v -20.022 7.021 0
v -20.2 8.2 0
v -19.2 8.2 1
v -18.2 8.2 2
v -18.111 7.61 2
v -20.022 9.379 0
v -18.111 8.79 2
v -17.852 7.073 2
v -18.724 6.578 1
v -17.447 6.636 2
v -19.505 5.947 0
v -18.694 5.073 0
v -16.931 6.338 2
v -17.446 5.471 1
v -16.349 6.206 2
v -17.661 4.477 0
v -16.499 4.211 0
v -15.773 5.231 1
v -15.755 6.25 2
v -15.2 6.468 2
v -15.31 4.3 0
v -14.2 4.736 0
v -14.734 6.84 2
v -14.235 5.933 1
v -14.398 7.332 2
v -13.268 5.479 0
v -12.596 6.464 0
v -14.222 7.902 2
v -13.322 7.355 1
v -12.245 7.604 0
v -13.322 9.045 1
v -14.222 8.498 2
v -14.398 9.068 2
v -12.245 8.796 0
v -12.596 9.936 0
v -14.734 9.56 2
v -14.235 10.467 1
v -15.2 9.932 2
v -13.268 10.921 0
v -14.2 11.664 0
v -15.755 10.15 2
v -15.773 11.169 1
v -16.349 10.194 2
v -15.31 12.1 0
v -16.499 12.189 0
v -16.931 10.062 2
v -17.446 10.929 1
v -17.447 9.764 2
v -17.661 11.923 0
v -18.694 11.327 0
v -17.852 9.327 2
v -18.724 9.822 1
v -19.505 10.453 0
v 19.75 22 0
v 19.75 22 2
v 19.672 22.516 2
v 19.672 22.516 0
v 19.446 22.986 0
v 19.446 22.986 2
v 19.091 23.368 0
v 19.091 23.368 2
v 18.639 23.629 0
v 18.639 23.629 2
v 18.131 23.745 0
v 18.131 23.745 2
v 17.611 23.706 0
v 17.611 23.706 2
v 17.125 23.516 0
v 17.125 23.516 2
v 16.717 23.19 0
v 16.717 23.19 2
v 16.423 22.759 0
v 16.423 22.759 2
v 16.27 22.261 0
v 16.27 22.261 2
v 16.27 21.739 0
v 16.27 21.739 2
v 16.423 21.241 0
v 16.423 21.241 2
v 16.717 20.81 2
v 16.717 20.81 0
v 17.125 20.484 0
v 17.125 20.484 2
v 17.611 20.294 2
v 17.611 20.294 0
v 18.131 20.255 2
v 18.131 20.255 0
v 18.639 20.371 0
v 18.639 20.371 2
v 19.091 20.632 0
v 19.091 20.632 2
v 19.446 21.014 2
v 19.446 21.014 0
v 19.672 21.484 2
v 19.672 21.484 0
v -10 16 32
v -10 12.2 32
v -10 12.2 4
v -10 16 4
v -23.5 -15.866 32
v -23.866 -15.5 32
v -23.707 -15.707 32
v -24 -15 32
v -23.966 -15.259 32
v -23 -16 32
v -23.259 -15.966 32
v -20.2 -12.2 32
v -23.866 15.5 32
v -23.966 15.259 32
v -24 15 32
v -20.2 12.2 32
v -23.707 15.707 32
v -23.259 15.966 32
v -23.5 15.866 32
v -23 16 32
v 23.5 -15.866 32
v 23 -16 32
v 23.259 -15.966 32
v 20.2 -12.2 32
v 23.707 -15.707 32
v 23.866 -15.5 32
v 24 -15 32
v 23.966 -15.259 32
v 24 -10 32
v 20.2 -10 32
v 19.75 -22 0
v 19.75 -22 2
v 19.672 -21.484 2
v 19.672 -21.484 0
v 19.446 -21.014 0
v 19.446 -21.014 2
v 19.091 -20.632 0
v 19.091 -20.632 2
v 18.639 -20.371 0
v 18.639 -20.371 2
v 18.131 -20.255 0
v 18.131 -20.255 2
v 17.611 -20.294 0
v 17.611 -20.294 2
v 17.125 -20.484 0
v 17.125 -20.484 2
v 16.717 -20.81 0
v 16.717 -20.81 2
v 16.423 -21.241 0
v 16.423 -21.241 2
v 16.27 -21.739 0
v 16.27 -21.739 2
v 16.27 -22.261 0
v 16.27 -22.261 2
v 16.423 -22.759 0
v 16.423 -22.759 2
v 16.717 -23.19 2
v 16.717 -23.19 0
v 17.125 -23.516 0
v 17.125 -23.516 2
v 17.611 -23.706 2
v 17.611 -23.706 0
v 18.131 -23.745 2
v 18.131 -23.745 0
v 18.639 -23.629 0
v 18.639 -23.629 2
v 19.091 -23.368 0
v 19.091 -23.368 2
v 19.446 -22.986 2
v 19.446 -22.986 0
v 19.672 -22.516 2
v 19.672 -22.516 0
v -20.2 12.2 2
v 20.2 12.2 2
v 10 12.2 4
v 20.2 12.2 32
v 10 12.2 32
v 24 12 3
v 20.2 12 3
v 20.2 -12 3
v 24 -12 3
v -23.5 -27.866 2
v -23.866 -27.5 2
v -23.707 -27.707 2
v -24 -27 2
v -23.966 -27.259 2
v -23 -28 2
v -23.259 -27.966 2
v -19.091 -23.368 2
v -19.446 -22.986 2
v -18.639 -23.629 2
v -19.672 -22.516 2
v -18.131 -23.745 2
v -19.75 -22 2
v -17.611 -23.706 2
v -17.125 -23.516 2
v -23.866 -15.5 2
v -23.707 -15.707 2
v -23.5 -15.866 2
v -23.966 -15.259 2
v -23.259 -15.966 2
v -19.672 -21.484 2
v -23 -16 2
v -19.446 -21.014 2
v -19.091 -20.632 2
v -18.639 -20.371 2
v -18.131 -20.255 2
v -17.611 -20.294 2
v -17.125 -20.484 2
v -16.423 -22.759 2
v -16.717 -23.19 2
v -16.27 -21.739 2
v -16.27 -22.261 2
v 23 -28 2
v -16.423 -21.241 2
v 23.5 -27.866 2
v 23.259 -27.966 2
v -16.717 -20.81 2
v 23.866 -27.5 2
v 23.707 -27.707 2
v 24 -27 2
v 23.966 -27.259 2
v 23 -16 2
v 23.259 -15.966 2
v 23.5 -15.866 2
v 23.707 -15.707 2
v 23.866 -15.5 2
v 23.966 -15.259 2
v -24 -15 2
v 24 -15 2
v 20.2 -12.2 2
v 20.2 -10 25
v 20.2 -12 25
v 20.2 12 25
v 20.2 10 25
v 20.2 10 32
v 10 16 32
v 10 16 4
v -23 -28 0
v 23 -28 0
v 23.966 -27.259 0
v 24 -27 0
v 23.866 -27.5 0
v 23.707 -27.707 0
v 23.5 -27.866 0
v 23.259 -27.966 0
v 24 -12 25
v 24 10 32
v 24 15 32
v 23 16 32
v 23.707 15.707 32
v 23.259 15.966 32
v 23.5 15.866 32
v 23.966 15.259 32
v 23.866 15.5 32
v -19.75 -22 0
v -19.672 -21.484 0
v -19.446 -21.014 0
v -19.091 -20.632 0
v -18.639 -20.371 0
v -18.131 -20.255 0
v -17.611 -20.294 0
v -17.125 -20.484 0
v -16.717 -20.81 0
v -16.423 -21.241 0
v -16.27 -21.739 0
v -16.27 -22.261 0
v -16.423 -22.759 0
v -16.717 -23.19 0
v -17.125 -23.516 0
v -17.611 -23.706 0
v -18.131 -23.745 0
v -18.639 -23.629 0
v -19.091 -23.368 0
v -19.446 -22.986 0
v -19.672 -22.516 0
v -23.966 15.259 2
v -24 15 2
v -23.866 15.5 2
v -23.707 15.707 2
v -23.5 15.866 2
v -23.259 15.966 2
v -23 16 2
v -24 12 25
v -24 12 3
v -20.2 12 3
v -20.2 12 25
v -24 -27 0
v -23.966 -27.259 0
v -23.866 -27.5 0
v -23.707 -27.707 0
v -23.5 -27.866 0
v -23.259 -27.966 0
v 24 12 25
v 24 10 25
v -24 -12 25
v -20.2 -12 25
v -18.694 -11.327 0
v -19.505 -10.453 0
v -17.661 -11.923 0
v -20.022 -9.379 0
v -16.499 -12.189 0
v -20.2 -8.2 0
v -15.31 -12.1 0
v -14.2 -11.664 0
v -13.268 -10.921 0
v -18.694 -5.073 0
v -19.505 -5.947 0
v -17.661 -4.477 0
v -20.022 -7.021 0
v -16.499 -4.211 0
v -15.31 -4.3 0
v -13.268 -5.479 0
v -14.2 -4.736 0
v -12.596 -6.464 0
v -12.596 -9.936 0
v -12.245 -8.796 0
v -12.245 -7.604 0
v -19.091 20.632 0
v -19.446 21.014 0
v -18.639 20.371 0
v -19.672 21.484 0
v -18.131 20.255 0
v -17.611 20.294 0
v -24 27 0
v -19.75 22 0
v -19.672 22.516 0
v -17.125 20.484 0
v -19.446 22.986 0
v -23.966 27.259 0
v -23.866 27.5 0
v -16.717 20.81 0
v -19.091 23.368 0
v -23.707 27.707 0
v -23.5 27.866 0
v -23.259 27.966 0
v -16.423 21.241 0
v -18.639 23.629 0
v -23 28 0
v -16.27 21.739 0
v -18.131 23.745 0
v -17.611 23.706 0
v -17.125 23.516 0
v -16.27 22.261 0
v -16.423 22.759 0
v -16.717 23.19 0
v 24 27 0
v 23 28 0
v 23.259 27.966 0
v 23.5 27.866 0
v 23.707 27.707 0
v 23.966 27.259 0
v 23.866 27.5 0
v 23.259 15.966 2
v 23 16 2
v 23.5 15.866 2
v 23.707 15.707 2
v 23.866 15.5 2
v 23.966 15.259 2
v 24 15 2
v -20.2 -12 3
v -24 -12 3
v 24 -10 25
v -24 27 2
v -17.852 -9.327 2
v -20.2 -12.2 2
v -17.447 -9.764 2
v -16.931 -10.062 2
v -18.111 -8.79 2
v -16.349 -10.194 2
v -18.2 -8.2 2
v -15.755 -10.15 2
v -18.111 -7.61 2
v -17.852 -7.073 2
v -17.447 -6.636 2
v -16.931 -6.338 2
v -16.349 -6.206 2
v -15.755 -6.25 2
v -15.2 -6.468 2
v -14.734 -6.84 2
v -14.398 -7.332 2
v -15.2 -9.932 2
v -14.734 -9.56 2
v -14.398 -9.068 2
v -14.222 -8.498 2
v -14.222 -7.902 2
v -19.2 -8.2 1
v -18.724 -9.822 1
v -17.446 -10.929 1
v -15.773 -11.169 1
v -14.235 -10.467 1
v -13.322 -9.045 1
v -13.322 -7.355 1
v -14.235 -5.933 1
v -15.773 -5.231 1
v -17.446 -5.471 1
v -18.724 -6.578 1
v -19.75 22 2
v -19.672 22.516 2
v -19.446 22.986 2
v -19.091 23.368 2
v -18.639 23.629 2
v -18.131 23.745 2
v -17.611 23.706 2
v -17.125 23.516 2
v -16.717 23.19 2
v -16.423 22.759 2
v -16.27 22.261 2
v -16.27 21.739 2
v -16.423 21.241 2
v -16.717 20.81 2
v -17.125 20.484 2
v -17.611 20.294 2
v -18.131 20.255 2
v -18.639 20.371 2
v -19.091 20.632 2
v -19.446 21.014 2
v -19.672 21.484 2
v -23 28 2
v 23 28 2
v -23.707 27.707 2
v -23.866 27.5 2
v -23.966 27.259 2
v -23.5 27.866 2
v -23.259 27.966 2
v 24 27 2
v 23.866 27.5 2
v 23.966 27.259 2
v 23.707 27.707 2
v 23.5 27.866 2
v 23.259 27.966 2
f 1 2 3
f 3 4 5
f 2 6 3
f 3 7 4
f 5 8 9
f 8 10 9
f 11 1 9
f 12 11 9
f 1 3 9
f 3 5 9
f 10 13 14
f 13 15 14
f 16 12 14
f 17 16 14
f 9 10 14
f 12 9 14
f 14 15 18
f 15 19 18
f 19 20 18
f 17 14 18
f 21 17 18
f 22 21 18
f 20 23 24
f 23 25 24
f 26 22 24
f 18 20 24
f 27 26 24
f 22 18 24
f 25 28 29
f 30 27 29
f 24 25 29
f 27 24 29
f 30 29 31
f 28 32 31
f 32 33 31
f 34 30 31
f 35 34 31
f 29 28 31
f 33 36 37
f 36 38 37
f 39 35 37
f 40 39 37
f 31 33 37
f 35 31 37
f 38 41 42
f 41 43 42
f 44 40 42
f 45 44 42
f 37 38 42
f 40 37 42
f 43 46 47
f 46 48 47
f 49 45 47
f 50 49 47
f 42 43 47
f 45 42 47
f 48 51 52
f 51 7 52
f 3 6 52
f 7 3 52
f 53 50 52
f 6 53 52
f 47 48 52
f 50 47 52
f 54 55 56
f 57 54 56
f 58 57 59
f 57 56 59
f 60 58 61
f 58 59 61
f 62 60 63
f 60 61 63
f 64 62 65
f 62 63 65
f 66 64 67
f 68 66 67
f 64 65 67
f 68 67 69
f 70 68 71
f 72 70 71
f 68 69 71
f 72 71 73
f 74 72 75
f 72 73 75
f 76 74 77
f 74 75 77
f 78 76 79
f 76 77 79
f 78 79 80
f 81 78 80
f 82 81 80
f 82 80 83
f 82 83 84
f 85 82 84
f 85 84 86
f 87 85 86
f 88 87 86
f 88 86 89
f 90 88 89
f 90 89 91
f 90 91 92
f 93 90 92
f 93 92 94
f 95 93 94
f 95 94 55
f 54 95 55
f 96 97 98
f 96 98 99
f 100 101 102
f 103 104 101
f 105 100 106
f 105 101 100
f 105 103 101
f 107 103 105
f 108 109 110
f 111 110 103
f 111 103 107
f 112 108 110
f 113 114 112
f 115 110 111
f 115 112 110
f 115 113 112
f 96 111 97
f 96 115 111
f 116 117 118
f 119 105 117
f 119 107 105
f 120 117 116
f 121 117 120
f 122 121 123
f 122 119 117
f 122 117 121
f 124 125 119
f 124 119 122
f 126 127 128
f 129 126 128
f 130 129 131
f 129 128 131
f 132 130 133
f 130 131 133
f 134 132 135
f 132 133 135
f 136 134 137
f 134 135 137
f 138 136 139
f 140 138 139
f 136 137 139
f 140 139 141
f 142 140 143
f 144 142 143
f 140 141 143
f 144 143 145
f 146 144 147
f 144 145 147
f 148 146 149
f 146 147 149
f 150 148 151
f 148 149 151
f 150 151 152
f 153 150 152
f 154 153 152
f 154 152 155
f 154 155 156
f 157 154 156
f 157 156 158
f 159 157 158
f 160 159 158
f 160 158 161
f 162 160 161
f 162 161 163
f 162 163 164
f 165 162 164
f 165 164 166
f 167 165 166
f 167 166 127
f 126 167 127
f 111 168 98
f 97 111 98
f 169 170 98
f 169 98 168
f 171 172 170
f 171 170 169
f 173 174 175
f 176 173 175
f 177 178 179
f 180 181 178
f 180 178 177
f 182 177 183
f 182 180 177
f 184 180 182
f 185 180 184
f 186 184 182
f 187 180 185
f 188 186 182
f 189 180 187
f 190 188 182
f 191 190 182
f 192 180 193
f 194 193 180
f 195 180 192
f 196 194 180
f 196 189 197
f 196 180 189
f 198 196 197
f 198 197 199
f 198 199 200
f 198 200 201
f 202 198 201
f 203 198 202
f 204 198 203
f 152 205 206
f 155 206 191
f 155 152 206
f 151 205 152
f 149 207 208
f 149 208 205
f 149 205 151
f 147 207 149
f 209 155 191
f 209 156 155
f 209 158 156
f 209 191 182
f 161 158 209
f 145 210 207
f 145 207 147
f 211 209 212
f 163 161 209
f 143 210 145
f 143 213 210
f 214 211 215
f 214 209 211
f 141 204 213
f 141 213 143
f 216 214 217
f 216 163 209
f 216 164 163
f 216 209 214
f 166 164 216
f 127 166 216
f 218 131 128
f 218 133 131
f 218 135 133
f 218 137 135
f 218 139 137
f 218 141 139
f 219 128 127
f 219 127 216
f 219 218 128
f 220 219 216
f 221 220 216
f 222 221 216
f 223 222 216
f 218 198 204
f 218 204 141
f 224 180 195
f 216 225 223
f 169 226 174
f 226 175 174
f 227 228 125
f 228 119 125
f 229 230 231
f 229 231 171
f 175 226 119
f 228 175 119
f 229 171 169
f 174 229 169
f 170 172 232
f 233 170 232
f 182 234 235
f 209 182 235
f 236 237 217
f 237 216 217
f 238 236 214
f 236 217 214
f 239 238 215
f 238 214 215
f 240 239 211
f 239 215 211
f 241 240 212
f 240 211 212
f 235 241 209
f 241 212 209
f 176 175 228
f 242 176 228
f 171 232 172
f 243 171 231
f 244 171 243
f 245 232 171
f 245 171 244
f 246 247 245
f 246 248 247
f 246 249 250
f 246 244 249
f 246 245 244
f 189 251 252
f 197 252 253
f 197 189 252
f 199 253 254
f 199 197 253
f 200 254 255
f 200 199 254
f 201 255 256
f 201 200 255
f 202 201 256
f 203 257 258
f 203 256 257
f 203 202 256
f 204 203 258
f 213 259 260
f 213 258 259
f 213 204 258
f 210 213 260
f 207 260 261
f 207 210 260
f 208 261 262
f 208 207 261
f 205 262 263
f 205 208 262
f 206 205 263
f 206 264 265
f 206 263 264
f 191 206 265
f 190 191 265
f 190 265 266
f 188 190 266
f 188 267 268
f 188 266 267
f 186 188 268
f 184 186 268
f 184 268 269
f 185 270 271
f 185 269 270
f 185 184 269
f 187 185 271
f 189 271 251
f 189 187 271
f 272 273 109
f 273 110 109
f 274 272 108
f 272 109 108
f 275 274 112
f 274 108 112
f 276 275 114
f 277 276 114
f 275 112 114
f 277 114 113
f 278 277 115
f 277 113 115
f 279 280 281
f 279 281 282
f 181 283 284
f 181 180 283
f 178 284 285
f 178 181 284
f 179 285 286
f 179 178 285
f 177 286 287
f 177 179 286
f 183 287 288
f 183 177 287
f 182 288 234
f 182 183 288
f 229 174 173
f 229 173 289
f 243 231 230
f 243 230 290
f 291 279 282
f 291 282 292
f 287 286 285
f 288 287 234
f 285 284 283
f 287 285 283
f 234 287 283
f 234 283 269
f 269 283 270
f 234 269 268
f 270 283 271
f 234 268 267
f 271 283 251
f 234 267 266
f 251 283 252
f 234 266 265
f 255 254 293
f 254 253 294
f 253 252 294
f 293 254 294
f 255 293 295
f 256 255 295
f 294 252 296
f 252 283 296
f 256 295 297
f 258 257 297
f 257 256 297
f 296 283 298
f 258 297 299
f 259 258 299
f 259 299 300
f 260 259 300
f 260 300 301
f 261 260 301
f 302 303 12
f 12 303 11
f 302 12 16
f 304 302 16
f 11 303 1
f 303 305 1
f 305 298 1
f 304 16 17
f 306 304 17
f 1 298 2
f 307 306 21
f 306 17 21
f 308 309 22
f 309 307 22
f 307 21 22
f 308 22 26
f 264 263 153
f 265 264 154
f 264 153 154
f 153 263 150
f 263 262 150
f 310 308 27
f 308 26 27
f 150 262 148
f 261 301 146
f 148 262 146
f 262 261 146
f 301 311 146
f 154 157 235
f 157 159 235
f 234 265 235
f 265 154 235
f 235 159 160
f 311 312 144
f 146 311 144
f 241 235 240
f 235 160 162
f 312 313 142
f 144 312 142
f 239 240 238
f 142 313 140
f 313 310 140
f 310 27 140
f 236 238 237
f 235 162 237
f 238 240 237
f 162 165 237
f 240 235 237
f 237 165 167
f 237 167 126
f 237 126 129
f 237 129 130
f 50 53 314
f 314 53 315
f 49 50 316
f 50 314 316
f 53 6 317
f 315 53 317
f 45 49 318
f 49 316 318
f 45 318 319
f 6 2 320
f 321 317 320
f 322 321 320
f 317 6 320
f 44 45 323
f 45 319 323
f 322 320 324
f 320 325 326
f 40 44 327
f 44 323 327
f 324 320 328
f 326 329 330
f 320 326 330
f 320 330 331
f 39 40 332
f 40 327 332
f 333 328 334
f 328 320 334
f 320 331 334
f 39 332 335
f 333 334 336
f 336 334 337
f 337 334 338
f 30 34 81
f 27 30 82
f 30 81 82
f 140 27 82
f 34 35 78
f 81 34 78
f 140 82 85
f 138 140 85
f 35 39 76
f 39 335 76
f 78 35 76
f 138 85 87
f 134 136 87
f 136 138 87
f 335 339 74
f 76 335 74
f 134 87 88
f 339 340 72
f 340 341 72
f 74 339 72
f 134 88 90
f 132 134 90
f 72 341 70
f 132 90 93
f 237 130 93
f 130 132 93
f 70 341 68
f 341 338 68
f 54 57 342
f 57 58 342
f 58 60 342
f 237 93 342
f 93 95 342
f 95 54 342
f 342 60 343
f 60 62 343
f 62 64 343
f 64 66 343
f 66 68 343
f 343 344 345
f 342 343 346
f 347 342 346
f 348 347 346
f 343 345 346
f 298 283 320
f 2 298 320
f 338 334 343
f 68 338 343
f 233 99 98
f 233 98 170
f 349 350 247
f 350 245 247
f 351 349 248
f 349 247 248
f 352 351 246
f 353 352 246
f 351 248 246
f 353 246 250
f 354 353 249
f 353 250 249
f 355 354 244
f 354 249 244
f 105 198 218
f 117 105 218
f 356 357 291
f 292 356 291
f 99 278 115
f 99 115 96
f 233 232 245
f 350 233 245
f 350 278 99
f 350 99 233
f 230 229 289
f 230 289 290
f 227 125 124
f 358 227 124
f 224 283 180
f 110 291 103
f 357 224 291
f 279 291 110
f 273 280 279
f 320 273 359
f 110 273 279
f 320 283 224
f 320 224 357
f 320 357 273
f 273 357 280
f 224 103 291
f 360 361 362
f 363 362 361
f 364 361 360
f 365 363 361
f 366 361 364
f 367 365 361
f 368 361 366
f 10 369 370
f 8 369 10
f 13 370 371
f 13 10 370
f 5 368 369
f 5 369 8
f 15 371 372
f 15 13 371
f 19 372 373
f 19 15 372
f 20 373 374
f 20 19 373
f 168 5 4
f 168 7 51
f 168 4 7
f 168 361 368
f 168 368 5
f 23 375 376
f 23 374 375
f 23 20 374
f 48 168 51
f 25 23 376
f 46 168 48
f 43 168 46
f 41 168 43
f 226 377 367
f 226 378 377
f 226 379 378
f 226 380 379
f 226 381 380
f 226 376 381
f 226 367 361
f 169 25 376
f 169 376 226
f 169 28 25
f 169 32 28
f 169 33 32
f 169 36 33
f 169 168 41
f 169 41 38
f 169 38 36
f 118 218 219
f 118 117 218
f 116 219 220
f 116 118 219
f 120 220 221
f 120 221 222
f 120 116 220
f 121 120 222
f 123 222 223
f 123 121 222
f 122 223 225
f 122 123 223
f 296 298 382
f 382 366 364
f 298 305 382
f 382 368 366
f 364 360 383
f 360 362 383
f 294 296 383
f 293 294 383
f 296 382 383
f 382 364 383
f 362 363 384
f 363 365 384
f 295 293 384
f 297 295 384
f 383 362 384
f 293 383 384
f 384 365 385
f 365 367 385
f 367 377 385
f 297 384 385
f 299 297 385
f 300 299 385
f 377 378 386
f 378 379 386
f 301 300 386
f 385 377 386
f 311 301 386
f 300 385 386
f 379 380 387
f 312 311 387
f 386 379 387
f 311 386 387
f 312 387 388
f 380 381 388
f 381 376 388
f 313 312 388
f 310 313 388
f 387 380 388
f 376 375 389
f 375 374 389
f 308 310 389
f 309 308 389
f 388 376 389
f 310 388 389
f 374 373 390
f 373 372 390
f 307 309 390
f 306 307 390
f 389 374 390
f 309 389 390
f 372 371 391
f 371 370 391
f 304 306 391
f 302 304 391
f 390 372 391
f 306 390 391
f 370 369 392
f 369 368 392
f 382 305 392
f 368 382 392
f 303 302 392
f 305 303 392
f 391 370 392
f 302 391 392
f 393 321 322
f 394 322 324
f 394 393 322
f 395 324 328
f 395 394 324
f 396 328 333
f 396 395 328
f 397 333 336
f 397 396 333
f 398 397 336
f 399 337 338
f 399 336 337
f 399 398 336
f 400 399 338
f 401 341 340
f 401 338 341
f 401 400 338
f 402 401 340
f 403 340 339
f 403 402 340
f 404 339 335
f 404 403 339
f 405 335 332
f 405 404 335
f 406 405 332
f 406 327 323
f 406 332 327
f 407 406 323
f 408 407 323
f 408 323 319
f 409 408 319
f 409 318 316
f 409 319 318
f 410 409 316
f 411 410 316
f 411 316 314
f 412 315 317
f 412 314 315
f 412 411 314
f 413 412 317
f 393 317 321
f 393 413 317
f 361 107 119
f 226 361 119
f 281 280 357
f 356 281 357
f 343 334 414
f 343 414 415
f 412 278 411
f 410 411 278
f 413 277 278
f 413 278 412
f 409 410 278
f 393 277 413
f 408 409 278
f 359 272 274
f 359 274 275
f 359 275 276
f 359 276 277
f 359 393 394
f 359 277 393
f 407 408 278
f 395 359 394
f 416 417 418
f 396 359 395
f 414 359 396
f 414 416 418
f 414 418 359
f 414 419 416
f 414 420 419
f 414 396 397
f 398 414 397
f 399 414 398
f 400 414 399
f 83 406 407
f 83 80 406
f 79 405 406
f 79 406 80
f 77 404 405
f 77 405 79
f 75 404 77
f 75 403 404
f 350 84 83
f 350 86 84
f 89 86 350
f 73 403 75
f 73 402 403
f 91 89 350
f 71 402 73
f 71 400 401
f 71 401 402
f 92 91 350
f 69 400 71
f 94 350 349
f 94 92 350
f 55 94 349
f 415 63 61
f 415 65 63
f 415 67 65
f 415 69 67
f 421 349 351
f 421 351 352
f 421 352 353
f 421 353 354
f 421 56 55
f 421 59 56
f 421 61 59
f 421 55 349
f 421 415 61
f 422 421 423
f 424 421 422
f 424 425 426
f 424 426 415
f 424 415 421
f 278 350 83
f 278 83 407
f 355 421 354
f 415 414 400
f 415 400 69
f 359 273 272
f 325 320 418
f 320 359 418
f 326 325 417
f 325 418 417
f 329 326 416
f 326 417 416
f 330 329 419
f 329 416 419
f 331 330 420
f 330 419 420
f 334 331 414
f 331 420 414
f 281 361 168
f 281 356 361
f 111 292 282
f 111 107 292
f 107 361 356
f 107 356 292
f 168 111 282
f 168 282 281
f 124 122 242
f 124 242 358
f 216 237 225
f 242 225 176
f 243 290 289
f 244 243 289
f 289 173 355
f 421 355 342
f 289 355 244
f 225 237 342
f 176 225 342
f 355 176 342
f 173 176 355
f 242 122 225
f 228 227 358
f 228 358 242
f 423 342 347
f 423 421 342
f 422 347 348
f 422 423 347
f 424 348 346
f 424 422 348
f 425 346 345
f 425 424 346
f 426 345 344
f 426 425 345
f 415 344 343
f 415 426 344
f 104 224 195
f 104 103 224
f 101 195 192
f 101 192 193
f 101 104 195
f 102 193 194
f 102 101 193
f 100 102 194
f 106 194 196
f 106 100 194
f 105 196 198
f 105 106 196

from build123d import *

# Parameters (mm, degrees)
SKETCH057_W         = 48
SKETCH057_H         = 56
PAD015_DEPTH        = 2
SKETCH058_R         = 1.75
HOLE023_DEPTH       = 25
SKETCH059_W         = 48
SKETCH059_H         = 32
PAD016_DEPTH        = 30
SKETCH060_W         = 40.4
SKETCH060_H         = 24.4
POCKET018_DEPTH     = 30
SKETCH061_W         = 20
SKETCH061_H         = 20
SKETCH061_W_2       = 40
POCKET019_DEPTH     = 28
SKETCH062_W         = 24
SKETCH062_H         = 22
POCKET020_DEPTH     = 50
SKETCH063_R         = 1.75
HOLE024_DEPTH       = 25
HOLE025_D           = 3.5
HOLE025_DEPTH       = 25
HOLE025_CSINK_D     = 8
HOLE025_CSINK_ANGLE = 90
HOLE025_TIPS_R      = 1.75
FILLET022_R         = 1
FILLET023_R         = 1


with BuildPart() as part:
    # Sketch057 → Pad015 (new body)
    with BuildSketch(Plane.XY):
        Rectangle(SKETCH057_W, SKETCH057_H)
    extrude(amount=PAD015_DEPTH)

    # Sketch058 (on Face6 of Pad015) → Hole023 (cut)
    with BuildSketch(Plane.XY.offset(2)):
        with Locations((18, 22)):
            Circle(SKETCH058_R)
        with Locations((18, -22)):
            Circle(SKETCH058_R)
    hole023 = extrude(amount=-HOLE023_DEPTH, mode=Mode.SUBTRACT)

    # Mirrored028: Hole023 across Sketch058 V_Axis
    add(hole023.mirror(Plane(origin=(0, 0, 2), x_dir=(0, 0, 1), z_dir=(1, 0, 0))), mode=Mode.SUBTRACT)

    # Sketch059 (on Face5 of Mirrored028) → Pad016 (join)
    with BuildSketch(Plane.XY.offset(2)):
        Rectangle(SKETCH059_W, SKETCH059_H)
    extrude(amount=PAD016_DEPTH)

    # Sketch060 (on Face12 of Pad016) → Pocket018 (cut)
    with BuildSketch(Plane.XY.offset(32)):
        Rectangle(SKETCH060_W, SKETCH060_H)
    extrude(amount=-POCKET018_DEPTH, mode=Mode.SUBTRACT)

    # Sketch061 (on Face8 of Pocket018) → Pocket019 (cut)
    with BuildSketch(Plane.XY.offset(32)):
        with Locations((0, 10)):
            Rectangle(SKETCH061_W, SKETCH061_H)
        with Locations((20, 0)):
            Rectangle(SKETCH061_W_2, SKETCH061_H)
    extrude(amount=-POCKET019_DEPTH, mode=Mode.SUBTRACT)

    # Sketch062 (on Face3 of Pocket019) → Pocket020 (cut)
    with BuildSketch(Plane(origin=(-24, 0, 0), x_dir=(0, -1, 0), z_dir=(-1, 0, 0))):
        with Locations((0, 14)):
            Rectangle(SKETCH062_W, SKETCH062_H)
    extrude(amount=-POCKET020_DEPTH, mode=Mode.SUBTRACT)

    # Sketch063 (on Face34 of Pocket020) → Hole024 (cut)
    with BuildSketch(Plane.XY.offset(2)):
        with Locations((-16.2, 8.2)):
            Circle(SKETCH063_R)
        with Locations((-16.2, -8.2)):
            Circle(SKETCH063_R)
    extrude(amount=-HOLE024_DEPTH, mode=Mode.SUBTRACT)

    # Hole025
    with Locations(Plane(origin=(0, 0, 0), x_dir=(1, 0, 0), z_dir=(0, 0, -1))):
        with Locations((-16.2, -8.2), (-16.2, 8.2)):
            CounterSinkHole(HOLE025_D / 2, HOLE025_CSINK_D / 2, depth=HOLE025_DEPTH, counter_sink_angle=HOLE025_CSINK_ANGLE)

    # Hole025 tips → Hole025 tip 1 section 0
    with BuildSketch(Plane(origin=(0, 0, 25), x_dir=(1, 0, 0), z_dir=(0, 0, -1)), mode=Mode.PRIVATE) as hole025_tip_1_s0:
        with Locations((-16.2, -8.2)):
            Circle(HOLE025_TIPS_R)
    loft([hole025_tip_1_s0.sketch, Vertex(-16.2, 8.2, 26.051506)], mode=Mode.SUBTRACT)

    # Hole025 tips → Hole025 tip 2 section 0
    with BuildSketch(Plane(origin=(0, 0, 25), x_dir=(1, 0, 0), z_dir=(0, 0, -1)), mode=Mode.PRIVATE) as hole025_tip_2_s0:
        with Locations((-16.2, 8.2)):
            Circle(HOLE025_TIPS_R)
    loft([hole025_tip_2_s0.sketch, Vertex(-16.2, -8.2, 26.051506)], mode=Mode.SUBTRACT)

    # Fillet022
    fillet022_edges = [part.edges().sort_by_distance(p)[0] for p in [
        (24, -28, 1),
        (24, 28, 1),
        (-24, -28, 1),
        (-24, 28, 1),
    ]]
    fillet(fillet022_edges, radius=FILLET022_R)

    # Fillet023
    fillet023_edges = [part.edges().sort_by_distance(p)[0] for p in [
        (24, 16, 17),
        (-24, 16, 17),
        (24, -16, 17),
        (-24, -16, 17),
    ]]
    fillet(fillet023_edges, radius=FILLET023_R)


solid = part.part
